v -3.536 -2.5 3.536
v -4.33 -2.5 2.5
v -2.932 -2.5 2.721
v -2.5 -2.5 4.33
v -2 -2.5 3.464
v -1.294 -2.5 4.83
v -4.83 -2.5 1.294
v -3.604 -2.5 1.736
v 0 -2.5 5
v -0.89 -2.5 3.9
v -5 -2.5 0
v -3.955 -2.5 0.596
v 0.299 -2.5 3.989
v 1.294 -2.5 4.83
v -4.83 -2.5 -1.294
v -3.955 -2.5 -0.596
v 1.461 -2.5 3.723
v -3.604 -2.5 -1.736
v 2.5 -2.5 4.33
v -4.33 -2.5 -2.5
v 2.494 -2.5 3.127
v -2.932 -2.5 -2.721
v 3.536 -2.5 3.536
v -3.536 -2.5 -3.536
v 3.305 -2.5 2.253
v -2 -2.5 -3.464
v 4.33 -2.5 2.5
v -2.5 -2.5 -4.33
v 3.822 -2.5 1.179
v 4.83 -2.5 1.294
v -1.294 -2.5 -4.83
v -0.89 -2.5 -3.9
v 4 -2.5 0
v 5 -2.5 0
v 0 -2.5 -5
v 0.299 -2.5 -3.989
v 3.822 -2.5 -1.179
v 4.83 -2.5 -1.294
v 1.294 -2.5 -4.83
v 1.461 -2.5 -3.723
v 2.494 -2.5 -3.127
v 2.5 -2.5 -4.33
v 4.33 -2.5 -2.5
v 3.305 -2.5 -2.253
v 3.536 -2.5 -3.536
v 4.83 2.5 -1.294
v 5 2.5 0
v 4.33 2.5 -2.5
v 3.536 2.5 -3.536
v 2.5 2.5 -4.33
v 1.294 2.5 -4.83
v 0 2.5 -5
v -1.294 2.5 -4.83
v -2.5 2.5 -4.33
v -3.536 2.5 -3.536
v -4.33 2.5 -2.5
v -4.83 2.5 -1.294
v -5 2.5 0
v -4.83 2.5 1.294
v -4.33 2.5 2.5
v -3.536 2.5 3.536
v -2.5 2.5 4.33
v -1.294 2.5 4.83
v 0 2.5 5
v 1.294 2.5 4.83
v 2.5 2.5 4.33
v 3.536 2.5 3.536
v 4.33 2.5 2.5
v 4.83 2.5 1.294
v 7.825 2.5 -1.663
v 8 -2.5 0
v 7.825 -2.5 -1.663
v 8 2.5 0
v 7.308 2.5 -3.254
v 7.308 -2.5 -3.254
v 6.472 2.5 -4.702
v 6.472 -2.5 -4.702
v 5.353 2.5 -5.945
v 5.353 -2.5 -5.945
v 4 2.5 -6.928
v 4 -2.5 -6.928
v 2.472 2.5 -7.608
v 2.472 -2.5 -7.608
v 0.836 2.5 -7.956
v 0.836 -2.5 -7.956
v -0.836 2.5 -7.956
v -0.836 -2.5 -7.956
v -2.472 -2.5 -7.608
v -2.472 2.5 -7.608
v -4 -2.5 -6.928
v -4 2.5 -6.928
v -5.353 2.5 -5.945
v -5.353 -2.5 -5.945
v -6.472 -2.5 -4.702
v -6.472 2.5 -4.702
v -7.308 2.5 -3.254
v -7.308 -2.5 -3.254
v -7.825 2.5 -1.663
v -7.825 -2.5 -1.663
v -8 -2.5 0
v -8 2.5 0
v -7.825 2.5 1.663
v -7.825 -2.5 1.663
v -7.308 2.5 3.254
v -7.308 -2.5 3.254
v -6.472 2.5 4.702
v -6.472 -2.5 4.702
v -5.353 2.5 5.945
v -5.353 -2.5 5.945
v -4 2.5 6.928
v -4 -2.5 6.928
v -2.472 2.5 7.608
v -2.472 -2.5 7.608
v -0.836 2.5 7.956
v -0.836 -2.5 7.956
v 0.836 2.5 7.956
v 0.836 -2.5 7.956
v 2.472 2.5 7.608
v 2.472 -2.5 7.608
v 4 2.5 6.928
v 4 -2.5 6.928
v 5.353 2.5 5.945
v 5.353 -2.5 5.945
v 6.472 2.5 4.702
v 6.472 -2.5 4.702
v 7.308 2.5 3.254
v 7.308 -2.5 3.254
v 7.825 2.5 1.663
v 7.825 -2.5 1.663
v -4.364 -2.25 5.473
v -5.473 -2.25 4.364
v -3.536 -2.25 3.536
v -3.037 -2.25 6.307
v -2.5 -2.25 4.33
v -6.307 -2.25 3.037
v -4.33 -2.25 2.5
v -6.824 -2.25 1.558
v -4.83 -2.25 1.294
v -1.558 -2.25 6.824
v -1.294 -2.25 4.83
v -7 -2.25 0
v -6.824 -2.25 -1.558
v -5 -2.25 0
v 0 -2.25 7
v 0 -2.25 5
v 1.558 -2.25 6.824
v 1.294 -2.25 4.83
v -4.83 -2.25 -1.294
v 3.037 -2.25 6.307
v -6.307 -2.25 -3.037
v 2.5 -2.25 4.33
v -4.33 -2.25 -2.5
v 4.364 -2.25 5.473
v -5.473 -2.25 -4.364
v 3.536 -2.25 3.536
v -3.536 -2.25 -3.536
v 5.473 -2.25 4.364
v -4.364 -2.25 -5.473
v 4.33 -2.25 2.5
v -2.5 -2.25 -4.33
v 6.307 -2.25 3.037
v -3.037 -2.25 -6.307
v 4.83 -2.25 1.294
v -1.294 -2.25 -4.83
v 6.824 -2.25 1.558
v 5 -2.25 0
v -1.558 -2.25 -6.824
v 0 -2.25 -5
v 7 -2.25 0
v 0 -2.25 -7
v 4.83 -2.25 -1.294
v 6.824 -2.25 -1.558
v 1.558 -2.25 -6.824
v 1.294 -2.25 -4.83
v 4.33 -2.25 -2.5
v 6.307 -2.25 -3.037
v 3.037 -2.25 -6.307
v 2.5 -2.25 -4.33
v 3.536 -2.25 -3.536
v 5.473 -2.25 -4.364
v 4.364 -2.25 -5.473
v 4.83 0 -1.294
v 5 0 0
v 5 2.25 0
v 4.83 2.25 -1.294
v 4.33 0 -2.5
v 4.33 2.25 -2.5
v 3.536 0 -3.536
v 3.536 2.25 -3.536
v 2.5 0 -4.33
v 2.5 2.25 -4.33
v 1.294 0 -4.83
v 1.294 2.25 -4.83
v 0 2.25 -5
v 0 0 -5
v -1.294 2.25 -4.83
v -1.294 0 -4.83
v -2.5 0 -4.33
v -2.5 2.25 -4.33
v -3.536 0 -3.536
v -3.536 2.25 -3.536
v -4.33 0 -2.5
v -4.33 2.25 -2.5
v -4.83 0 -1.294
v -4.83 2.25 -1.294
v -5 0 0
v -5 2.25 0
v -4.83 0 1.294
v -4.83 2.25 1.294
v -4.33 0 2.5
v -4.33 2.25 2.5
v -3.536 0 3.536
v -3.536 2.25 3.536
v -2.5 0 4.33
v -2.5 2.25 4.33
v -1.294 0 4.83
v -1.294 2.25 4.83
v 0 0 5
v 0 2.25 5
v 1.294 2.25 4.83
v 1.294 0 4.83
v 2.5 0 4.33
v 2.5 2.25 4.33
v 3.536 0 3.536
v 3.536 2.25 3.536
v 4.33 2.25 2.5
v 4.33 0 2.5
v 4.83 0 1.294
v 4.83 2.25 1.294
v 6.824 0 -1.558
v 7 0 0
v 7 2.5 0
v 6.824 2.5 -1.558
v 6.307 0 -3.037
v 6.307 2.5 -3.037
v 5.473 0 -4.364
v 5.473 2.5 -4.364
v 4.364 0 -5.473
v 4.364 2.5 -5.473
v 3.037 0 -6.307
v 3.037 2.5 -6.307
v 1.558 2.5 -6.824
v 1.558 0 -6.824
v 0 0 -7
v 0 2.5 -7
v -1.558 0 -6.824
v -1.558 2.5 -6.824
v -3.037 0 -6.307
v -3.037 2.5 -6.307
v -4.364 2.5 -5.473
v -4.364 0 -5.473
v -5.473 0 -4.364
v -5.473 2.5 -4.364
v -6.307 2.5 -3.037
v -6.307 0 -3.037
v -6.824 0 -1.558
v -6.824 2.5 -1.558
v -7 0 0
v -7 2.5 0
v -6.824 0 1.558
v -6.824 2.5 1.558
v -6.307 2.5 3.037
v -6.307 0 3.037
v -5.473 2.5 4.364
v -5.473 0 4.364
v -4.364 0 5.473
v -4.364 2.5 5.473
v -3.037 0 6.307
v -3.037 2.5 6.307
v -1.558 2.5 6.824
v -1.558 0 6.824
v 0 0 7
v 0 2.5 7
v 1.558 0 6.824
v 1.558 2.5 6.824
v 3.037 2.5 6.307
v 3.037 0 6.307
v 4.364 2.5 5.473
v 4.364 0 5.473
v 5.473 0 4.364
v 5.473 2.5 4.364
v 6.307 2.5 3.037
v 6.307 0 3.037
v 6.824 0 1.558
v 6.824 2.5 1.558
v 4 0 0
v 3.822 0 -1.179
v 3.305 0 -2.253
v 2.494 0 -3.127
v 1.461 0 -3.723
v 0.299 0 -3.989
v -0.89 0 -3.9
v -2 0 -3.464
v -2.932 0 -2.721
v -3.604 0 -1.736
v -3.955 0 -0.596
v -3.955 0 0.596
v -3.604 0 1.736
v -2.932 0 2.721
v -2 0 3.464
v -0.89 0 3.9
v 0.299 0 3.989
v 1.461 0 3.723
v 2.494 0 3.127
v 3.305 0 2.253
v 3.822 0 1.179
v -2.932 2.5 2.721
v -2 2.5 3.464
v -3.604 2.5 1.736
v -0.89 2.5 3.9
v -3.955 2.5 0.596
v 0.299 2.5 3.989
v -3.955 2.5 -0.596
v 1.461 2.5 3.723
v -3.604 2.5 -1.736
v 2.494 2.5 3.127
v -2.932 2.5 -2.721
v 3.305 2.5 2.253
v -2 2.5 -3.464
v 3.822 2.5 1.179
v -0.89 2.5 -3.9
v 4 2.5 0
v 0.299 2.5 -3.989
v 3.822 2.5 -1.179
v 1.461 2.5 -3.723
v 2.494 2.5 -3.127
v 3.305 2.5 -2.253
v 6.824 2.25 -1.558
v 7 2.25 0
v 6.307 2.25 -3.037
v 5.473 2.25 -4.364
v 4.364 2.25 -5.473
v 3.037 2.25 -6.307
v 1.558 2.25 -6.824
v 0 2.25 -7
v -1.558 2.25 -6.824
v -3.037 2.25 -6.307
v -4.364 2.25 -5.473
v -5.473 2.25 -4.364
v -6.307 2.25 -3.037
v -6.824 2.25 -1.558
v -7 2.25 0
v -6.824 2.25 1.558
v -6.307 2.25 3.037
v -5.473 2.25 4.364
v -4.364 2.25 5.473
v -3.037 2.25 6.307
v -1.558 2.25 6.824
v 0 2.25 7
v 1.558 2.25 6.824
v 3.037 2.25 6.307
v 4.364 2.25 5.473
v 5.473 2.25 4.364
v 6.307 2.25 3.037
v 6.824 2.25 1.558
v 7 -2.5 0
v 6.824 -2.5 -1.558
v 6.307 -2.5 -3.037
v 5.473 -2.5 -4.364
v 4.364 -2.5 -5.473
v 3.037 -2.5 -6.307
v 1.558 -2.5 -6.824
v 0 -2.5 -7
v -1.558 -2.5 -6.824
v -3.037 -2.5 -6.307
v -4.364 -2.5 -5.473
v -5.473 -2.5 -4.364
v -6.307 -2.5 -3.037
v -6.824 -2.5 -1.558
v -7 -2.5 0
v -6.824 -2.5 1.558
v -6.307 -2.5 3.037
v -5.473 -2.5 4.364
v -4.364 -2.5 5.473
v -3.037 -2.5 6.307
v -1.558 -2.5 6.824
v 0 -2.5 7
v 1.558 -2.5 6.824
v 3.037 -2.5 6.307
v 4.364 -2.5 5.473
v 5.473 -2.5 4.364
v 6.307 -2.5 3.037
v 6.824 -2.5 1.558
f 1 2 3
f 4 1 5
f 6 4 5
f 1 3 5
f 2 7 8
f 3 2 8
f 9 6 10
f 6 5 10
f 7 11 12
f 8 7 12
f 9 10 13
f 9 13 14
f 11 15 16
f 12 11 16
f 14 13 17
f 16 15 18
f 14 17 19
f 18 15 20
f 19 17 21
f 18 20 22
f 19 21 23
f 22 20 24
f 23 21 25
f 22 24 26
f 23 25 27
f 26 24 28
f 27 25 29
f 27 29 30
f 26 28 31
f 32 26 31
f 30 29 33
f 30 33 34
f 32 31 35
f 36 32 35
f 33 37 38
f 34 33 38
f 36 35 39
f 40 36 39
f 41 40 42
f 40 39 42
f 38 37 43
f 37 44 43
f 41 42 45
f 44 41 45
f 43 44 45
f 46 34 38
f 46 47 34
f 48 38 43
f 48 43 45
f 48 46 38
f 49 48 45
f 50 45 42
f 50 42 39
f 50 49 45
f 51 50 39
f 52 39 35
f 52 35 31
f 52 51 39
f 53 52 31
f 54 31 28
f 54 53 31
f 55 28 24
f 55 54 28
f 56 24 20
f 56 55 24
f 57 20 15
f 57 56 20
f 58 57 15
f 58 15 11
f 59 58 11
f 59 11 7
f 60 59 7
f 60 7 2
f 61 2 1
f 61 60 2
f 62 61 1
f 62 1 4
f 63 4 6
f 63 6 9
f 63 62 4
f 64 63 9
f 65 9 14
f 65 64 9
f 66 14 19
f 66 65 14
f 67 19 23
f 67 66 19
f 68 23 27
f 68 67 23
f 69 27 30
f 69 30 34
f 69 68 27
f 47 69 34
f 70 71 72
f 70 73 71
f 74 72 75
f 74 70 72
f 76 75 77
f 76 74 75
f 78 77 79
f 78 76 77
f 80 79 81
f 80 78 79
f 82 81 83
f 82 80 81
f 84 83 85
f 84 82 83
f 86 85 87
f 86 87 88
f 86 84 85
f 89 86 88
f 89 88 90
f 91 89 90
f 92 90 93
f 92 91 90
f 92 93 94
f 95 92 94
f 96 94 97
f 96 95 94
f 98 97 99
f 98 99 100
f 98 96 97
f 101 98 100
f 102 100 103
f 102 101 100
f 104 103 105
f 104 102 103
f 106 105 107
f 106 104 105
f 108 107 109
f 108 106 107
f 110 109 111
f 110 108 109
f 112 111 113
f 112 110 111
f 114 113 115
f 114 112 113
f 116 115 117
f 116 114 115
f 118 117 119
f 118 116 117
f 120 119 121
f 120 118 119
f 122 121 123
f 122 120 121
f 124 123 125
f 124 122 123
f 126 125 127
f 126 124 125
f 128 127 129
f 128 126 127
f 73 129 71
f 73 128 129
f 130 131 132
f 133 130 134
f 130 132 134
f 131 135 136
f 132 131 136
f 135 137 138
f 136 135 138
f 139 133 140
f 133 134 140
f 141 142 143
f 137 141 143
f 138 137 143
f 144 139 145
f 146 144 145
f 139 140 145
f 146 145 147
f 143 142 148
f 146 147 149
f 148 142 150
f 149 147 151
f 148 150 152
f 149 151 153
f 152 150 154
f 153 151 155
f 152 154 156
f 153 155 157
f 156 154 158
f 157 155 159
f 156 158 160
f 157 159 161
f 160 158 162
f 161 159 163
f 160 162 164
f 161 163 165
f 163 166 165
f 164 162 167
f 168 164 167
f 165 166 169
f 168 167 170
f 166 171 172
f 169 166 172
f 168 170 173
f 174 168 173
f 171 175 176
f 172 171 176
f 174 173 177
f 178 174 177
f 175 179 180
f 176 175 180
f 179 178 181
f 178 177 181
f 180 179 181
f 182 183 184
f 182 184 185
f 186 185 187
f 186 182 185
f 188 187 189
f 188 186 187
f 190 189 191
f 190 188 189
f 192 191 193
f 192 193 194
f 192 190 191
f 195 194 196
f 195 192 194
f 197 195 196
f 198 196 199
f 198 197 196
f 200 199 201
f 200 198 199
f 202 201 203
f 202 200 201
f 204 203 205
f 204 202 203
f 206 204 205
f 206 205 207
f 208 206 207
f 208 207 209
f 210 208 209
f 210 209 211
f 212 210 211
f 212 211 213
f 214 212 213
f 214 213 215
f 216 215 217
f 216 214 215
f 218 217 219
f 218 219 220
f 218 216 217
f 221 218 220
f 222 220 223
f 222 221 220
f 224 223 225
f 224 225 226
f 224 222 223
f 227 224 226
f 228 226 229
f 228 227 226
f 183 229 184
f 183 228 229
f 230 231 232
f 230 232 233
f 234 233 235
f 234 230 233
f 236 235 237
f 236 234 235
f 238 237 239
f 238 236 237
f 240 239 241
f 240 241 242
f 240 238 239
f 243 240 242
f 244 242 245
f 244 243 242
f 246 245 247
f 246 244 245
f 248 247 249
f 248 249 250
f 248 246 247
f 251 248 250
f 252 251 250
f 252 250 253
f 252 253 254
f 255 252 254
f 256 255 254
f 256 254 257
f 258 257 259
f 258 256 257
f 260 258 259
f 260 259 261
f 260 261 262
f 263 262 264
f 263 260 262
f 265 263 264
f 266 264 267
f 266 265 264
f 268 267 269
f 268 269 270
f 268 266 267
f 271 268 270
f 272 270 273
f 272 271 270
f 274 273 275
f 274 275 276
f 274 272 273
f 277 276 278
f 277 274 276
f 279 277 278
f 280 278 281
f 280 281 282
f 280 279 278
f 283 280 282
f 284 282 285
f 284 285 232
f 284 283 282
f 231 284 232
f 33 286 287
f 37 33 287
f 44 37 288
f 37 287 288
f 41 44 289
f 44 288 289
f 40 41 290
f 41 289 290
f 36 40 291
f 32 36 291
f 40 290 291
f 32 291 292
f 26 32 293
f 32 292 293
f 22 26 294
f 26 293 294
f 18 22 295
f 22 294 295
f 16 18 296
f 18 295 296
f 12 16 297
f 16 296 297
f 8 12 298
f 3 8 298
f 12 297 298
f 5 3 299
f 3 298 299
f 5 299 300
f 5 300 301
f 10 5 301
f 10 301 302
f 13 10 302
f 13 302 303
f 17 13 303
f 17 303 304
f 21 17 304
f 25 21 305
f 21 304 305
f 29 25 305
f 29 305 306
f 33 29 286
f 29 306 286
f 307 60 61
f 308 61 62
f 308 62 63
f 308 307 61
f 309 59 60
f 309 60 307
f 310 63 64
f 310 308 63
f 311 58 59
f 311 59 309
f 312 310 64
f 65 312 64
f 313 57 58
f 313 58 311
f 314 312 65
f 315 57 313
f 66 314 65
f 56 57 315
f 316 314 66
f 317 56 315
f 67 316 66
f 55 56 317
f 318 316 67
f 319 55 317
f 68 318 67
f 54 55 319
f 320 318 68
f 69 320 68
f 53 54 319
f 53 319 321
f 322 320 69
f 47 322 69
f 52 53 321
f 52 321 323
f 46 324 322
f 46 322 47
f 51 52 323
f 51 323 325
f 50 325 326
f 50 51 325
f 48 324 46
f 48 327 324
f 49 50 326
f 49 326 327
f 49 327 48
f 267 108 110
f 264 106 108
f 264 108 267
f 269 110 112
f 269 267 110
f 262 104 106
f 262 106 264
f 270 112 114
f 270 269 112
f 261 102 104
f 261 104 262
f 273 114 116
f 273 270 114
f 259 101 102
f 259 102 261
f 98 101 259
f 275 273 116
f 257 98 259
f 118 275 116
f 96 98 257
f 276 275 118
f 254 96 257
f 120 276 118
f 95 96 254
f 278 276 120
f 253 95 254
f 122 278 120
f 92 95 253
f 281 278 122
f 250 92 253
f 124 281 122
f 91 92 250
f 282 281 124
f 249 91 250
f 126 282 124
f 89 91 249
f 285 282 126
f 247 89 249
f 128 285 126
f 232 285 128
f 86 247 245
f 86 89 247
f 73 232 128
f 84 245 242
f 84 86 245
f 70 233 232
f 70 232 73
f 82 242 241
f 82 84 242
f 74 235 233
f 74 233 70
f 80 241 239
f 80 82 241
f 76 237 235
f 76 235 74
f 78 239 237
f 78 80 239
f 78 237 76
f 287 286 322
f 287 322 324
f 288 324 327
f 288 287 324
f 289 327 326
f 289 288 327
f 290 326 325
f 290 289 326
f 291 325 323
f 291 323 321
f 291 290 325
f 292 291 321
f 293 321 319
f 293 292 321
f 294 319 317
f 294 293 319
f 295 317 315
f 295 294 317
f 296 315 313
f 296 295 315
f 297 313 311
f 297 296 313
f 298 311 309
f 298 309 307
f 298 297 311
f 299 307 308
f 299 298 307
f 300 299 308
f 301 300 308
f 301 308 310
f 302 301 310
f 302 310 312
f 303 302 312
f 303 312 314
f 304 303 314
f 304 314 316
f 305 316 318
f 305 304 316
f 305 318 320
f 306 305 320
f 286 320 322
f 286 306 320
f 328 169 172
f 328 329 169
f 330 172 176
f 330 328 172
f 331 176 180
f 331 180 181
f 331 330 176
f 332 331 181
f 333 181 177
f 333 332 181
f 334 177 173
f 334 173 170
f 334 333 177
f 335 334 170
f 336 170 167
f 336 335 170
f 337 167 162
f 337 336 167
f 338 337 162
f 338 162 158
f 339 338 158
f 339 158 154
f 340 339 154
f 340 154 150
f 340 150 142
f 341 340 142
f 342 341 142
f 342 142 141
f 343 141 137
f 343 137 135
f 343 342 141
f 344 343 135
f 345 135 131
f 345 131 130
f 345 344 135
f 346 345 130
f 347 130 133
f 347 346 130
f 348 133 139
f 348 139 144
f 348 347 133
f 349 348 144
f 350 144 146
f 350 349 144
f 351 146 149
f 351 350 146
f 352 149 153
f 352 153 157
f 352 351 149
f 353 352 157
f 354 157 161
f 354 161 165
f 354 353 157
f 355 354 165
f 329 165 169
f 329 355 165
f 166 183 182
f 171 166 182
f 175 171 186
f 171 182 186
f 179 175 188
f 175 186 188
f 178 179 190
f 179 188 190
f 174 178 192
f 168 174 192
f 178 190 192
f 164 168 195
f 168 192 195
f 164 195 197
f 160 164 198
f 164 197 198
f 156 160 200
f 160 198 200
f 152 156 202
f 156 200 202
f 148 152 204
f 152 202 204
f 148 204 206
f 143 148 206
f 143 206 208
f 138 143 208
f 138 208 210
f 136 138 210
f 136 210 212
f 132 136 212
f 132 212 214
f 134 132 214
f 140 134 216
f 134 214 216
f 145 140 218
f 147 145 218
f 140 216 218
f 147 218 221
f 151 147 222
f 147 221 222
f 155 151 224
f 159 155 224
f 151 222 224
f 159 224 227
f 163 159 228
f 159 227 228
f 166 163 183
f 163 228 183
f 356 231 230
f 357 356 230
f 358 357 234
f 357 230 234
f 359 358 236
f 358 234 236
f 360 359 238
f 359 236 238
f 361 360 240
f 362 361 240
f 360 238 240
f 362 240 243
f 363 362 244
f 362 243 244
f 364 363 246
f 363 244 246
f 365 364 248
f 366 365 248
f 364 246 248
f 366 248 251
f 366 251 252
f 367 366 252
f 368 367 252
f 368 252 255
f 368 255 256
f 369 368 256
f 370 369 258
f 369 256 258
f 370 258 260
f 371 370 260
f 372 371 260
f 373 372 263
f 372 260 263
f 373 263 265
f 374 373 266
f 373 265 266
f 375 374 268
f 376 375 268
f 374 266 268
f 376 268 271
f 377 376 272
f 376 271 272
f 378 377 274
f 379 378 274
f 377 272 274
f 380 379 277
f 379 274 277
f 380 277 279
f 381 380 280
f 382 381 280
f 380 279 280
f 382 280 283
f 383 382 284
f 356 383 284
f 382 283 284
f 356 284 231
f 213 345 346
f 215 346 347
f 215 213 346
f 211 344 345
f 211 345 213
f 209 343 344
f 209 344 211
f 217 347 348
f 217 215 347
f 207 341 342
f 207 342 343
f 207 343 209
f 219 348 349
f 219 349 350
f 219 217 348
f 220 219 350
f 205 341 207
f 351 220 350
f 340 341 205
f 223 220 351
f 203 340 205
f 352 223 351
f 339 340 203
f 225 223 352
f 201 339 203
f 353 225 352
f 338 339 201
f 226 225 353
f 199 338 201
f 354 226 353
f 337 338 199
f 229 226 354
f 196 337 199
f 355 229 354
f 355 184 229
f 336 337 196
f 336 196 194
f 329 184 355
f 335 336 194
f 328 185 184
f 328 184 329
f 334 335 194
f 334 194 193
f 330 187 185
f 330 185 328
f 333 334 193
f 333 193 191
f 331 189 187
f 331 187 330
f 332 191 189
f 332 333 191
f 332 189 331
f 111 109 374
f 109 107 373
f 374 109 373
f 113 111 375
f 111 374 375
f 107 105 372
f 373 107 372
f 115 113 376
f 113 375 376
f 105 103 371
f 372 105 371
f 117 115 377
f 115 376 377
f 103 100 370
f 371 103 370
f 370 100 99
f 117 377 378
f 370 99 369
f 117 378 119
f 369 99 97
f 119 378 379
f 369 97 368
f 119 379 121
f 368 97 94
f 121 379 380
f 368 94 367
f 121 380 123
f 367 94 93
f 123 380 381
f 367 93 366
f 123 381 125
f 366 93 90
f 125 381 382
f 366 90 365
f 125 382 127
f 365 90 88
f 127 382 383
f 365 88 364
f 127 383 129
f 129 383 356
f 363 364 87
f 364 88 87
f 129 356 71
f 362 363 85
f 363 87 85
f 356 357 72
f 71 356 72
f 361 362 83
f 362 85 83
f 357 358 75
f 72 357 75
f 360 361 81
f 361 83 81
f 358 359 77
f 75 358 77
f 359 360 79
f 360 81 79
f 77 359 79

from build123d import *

# Parameters (mm, degrees)
BOSS_EXTRUDE1_DEPTH        = 2.5
BOSS_EXTRUDE1_DEPTH_BACK   = 2.5
SKETCH1_R                  = 8
SKETCH1_R_2                = 7
BOSS_EXTRUDE1_2_DEPTH      = 2.5
BOSS_EXTRUDE1_2_DEPTH_BACK = 2.5
SKETCH1_R_3                = 5
SKETCH1_R_4                = 4
BOSS_EXTRUDE2_DEPTH        = 2.25
BOSS_EXTRUDE2_DEPTH_BACK   = 2.25
SKETCH2_R                  = 7
SKETCH2_R_2                = 5


with BuildPart() as part:
    # Sketch1 → Boss-Extrude1 (new, two sides: drawn at the far end of the back side and taken through both)
    with BuildSketch(Plane(origin=(0, 0, 0), x_dir=(1, 0, 0), z_dir=(0, 1, 0)).offset(-BOSS_EXTRUDE1_DEPTH_BACK)):
        Circle(SKETCH1_R)
        Circle(SKETCH1_R_2, mode=Mode.SUBTRACT)
    extrude(amount=BOSS_EXTRUDE1_DEPTH + BOSS_EXTRUDE1_DEPTH_BACK)


with BuildPart() as body_2:
    # Sketch1 → Boss-Extrude1 2 (new, two sides: drawn at the far end of the back side and taken through both)
    with BuildSketch(Plane(origin=(0, 0, 0), x_dir=(1, 0, 0), z_dir=(0, 1, 0)).offset(-BOSS_EXTRUDE1_2_DEPTH_BACK)):
        Circle(SKETCH1_R_3)
        Circle(SKETCH1_R_4, mode=Mode.SUBTRACT)
    extrude(amount=BOSS_EXTRUDE1_2_DEPTH + BOSS_EXTRUDE1_2_DEPTH_BACK)


with BuildPart() as body_3:
    # Sketch2 → Boss-Extrude2 (new, two sides: drawn at the far end of the back side and taken through both)
    with BuildSketch(Plane(origin=(0, 0, 0), x_dir=(1, 0, 0), z_dir=(0, 1, 0)).offset(-BOSS_EXTRUDE2_DEPTH_BACK)):
        Circle(SKETCH2_R)
        Circle(SKETCH2_R_2, mode=Mode.SUBTRACT)
    extrude(amount=BOSS_EXTRUDE2_DEPTH + BOSS_EXTRUDE2_DEPTH_BACK)


solid = Compound([part.part, body_2.part, body_3.part])
